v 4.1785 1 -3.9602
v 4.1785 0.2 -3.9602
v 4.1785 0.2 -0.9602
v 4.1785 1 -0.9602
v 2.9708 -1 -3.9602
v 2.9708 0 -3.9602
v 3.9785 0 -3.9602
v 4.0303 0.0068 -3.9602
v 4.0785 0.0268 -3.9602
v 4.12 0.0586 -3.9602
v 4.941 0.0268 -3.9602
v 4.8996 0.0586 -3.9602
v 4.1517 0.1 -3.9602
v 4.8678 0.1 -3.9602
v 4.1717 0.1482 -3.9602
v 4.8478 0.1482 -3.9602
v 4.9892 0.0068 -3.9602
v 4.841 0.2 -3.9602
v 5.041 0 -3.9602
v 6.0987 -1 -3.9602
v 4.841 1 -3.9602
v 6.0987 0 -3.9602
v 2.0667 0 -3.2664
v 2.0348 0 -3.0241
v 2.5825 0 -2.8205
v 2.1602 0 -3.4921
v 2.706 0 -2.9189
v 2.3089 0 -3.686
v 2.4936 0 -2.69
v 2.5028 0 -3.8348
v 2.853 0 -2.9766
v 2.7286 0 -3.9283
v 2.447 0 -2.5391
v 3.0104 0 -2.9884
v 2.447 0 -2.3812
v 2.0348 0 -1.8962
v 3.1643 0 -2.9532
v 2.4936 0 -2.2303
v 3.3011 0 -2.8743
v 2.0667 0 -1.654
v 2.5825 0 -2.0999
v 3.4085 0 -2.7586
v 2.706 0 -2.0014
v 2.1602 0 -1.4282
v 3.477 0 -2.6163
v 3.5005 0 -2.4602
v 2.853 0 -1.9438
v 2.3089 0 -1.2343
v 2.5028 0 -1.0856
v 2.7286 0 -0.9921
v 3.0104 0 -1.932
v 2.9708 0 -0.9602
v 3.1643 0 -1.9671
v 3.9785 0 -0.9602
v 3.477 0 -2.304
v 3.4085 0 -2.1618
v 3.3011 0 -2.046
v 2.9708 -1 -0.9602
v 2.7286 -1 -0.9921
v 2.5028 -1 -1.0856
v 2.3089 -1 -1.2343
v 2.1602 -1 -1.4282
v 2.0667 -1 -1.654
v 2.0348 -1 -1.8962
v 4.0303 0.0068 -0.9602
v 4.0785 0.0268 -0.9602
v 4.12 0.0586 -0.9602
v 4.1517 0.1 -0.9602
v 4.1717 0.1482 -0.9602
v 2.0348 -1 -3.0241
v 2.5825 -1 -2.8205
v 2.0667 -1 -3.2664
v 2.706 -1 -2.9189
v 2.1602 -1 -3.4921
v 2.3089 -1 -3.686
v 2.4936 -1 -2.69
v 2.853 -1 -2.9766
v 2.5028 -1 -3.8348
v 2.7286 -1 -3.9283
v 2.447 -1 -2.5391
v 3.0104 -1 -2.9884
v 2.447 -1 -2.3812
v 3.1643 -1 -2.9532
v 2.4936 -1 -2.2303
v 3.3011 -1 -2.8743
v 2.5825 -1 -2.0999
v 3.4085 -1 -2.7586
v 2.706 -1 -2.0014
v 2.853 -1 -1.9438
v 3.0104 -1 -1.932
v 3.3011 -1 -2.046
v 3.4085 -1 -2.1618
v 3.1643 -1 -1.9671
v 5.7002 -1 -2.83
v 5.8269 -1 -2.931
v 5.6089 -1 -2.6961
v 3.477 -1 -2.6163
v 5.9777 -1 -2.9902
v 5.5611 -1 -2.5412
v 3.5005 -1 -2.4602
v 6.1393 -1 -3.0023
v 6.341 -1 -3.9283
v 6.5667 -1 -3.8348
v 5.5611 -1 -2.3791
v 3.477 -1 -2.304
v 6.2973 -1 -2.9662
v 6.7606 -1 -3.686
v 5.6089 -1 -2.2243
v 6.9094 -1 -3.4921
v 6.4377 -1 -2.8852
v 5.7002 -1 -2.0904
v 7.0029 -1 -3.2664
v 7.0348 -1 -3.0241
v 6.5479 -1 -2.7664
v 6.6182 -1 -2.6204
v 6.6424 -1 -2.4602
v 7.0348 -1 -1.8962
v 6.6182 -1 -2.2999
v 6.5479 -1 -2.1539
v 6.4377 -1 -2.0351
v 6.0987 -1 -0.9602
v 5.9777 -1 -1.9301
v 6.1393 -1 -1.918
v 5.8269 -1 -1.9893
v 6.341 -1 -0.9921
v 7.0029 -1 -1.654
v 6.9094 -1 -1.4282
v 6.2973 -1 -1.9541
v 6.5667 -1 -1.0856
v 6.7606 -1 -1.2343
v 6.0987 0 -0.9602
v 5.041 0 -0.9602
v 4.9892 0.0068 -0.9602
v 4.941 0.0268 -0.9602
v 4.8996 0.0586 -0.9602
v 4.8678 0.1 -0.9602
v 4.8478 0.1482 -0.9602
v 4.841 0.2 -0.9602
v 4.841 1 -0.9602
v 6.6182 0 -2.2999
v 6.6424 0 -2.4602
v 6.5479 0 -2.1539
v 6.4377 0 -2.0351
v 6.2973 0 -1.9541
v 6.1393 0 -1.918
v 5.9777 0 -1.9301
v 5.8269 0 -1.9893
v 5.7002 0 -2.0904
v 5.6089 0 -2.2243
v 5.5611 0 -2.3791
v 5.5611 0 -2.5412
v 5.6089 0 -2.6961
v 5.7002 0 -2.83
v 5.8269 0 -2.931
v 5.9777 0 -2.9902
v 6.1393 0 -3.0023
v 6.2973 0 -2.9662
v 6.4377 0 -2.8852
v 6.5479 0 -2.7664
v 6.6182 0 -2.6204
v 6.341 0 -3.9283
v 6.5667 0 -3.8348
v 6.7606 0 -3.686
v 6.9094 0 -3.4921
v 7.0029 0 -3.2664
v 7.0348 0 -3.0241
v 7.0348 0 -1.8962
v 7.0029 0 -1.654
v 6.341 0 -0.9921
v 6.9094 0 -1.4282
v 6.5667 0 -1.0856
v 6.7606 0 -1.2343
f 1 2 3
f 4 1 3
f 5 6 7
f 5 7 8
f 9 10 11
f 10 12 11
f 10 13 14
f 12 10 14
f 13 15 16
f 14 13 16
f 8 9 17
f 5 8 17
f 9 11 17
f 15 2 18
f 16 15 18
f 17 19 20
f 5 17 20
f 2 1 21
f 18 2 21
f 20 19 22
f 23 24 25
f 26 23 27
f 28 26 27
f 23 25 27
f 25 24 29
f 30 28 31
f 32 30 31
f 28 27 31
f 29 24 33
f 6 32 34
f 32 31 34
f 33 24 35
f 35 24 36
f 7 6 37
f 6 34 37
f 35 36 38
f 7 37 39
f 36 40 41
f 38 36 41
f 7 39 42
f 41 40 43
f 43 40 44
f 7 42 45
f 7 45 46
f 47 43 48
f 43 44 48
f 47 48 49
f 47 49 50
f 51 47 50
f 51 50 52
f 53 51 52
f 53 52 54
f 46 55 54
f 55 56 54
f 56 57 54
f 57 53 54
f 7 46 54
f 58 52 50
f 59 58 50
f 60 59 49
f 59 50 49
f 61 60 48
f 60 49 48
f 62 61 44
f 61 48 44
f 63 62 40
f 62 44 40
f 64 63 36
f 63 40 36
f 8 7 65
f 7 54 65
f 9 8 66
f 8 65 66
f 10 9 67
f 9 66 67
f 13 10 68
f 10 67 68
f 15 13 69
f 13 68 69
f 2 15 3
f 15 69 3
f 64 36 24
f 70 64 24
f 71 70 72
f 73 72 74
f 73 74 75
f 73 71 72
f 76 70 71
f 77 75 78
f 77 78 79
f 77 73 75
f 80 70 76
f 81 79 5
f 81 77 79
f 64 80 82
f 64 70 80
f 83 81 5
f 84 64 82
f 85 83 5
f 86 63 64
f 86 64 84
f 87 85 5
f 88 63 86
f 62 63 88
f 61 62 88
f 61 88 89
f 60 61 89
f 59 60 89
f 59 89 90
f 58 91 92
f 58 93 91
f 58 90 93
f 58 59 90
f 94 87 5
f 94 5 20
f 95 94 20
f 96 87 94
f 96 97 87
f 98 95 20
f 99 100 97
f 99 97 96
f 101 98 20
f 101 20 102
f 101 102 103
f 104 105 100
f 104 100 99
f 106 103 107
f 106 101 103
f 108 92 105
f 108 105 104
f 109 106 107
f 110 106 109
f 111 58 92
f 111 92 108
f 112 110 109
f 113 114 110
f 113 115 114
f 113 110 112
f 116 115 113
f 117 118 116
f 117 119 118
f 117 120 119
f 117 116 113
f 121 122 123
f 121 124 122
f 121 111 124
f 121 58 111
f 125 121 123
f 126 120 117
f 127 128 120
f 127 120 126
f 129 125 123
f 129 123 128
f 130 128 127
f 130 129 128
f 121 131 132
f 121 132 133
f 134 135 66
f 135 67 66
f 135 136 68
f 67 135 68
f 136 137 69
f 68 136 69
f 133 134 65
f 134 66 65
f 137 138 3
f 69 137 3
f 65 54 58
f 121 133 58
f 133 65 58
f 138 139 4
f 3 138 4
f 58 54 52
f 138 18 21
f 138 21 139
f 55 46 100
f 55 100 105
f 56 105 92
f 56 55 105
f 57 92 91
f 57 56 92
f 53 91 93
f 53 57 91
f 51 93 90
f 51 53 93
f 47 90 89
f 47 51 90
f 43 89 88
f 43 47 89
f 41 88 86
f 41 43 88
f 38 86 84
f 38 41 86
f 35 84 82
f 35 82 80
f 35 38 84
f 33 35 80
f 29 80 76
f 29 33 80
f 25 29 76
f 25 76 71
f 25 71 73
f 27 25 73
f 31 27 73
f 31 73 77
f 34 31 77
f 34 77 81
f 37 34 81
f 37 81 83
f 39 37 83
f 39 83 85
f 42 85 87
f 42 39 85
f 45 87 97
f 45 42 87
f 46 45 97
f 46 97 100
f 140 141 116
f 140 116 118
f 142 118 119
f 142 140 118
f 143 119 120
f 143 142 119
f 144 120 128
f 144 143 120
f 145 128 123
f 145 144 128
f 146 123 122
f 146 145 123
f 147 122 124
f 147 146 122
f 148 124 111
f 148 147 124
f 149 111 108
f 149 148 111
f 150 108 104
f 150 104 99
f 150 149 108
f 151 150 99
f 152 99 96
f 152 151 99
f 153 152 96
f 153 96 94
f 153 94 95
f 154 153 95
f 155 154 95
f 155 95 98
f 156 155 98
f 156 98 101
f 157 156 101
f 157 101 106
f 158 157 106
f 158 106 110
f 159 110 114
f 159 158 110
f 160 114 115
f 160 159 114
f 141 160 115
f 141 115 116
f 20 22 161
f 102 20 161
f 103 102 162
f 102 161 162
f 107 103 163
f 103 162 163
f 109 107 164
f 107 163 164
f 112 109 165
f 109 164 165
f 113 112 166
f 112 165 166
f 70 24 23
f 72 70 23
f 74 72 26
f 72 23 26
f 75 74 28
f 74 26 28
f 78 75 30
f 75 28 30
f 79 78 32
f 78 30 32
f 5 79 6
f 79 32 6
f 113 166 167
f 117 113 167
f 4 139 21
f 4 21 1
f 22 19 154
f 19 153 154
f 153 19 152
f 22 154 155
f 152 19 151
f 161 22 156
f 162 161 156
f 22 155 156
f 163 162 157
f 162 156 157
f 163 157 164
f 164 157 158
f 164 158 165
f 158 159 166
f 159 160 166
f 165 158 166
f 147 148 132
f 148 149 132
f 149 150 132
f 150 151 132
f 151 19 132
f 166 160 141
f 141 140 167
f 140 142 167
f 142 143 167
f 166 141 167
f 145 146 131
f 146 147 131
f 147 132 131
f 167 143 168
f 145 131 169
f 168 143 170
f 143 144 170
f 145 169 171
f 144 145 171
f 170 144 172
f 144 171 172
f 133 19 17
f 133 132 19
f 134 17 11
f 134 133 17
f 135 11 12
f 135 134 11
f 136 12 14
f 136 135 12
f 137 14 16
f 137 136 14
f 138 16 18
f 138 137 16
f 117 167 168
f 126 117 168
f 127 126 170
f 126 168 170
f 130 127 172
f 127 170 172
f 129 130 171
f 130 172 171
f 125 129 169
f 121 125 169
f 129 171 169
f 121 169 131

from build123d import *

# Parameters (mm, degrees)
F0_R     = 0.543659
F0_R_2   = 0.529693
F1_DEPTH = 1
F2_W     = 0.662431
F2_H     = 3
F3_DEPTH = 1
F4_R     = 0.2


with BuildPart() as f1:
    # F0 (on Front) → F1 (new body)
    with BuildSketch(Plane.XZ):
        with BuildLine():
            Line((6.098702, -0.960169), (2.970826, -0.960169))
            ThreePointArc((2.970826, -0.960169), (2.30893, -1.234335), (2.034764, -1.896231))
            Line((2.034764, -1.896231), (2.034764, -3.024107))
            ThreePointArc((2.034764, -3.024107), (2.30893, -3.686003), (2.970826, -3.960169))
            Line((2.970826, -3.960169), (6.098702, -3.960169))
            ThreePointArc((6.098702, -3.960169), (6.760597, -3.686003), (7.034764, -3.024107))
            Line((7.034764, -3.024107), (7.034764, -1.896231))
            ThreePointArc((7.034764, -1.896231), (6.760597, -1.234335), (6.098702, -0.960169))
        make_face()
        with Locations((6.098702, -2.460169)):
            Circle(F0_R, mode=Mode.SUBTRACT)
        with Locations((2.970826, -2.460169)):
            Circle(F0_R_2, mode=Mode.SUBTRACT)
    extrude(amount=F1_DEPTH)

    # F2 (on face) → F3 (join)
    with BuildSketch(Plane(origin=(0, 0, 0), x_dir=(-1, 0, 0), z_dir=(0, 1, 0))):
        with Locations((-4.509756, -2.460169)):
            Rectangle(F2_W, F2_H)
    extrude(amount=F3_DEPTH)

    # F4
    f4_edges = [f1.edges().sort_by_distance(p)[0] for p in [
        (4.840972, 0, -2.460169),
        (4.178541, 0, -2.460169),
    ]]
    fillet(f4_edges, radius=F4_R)


solid = f1.part
